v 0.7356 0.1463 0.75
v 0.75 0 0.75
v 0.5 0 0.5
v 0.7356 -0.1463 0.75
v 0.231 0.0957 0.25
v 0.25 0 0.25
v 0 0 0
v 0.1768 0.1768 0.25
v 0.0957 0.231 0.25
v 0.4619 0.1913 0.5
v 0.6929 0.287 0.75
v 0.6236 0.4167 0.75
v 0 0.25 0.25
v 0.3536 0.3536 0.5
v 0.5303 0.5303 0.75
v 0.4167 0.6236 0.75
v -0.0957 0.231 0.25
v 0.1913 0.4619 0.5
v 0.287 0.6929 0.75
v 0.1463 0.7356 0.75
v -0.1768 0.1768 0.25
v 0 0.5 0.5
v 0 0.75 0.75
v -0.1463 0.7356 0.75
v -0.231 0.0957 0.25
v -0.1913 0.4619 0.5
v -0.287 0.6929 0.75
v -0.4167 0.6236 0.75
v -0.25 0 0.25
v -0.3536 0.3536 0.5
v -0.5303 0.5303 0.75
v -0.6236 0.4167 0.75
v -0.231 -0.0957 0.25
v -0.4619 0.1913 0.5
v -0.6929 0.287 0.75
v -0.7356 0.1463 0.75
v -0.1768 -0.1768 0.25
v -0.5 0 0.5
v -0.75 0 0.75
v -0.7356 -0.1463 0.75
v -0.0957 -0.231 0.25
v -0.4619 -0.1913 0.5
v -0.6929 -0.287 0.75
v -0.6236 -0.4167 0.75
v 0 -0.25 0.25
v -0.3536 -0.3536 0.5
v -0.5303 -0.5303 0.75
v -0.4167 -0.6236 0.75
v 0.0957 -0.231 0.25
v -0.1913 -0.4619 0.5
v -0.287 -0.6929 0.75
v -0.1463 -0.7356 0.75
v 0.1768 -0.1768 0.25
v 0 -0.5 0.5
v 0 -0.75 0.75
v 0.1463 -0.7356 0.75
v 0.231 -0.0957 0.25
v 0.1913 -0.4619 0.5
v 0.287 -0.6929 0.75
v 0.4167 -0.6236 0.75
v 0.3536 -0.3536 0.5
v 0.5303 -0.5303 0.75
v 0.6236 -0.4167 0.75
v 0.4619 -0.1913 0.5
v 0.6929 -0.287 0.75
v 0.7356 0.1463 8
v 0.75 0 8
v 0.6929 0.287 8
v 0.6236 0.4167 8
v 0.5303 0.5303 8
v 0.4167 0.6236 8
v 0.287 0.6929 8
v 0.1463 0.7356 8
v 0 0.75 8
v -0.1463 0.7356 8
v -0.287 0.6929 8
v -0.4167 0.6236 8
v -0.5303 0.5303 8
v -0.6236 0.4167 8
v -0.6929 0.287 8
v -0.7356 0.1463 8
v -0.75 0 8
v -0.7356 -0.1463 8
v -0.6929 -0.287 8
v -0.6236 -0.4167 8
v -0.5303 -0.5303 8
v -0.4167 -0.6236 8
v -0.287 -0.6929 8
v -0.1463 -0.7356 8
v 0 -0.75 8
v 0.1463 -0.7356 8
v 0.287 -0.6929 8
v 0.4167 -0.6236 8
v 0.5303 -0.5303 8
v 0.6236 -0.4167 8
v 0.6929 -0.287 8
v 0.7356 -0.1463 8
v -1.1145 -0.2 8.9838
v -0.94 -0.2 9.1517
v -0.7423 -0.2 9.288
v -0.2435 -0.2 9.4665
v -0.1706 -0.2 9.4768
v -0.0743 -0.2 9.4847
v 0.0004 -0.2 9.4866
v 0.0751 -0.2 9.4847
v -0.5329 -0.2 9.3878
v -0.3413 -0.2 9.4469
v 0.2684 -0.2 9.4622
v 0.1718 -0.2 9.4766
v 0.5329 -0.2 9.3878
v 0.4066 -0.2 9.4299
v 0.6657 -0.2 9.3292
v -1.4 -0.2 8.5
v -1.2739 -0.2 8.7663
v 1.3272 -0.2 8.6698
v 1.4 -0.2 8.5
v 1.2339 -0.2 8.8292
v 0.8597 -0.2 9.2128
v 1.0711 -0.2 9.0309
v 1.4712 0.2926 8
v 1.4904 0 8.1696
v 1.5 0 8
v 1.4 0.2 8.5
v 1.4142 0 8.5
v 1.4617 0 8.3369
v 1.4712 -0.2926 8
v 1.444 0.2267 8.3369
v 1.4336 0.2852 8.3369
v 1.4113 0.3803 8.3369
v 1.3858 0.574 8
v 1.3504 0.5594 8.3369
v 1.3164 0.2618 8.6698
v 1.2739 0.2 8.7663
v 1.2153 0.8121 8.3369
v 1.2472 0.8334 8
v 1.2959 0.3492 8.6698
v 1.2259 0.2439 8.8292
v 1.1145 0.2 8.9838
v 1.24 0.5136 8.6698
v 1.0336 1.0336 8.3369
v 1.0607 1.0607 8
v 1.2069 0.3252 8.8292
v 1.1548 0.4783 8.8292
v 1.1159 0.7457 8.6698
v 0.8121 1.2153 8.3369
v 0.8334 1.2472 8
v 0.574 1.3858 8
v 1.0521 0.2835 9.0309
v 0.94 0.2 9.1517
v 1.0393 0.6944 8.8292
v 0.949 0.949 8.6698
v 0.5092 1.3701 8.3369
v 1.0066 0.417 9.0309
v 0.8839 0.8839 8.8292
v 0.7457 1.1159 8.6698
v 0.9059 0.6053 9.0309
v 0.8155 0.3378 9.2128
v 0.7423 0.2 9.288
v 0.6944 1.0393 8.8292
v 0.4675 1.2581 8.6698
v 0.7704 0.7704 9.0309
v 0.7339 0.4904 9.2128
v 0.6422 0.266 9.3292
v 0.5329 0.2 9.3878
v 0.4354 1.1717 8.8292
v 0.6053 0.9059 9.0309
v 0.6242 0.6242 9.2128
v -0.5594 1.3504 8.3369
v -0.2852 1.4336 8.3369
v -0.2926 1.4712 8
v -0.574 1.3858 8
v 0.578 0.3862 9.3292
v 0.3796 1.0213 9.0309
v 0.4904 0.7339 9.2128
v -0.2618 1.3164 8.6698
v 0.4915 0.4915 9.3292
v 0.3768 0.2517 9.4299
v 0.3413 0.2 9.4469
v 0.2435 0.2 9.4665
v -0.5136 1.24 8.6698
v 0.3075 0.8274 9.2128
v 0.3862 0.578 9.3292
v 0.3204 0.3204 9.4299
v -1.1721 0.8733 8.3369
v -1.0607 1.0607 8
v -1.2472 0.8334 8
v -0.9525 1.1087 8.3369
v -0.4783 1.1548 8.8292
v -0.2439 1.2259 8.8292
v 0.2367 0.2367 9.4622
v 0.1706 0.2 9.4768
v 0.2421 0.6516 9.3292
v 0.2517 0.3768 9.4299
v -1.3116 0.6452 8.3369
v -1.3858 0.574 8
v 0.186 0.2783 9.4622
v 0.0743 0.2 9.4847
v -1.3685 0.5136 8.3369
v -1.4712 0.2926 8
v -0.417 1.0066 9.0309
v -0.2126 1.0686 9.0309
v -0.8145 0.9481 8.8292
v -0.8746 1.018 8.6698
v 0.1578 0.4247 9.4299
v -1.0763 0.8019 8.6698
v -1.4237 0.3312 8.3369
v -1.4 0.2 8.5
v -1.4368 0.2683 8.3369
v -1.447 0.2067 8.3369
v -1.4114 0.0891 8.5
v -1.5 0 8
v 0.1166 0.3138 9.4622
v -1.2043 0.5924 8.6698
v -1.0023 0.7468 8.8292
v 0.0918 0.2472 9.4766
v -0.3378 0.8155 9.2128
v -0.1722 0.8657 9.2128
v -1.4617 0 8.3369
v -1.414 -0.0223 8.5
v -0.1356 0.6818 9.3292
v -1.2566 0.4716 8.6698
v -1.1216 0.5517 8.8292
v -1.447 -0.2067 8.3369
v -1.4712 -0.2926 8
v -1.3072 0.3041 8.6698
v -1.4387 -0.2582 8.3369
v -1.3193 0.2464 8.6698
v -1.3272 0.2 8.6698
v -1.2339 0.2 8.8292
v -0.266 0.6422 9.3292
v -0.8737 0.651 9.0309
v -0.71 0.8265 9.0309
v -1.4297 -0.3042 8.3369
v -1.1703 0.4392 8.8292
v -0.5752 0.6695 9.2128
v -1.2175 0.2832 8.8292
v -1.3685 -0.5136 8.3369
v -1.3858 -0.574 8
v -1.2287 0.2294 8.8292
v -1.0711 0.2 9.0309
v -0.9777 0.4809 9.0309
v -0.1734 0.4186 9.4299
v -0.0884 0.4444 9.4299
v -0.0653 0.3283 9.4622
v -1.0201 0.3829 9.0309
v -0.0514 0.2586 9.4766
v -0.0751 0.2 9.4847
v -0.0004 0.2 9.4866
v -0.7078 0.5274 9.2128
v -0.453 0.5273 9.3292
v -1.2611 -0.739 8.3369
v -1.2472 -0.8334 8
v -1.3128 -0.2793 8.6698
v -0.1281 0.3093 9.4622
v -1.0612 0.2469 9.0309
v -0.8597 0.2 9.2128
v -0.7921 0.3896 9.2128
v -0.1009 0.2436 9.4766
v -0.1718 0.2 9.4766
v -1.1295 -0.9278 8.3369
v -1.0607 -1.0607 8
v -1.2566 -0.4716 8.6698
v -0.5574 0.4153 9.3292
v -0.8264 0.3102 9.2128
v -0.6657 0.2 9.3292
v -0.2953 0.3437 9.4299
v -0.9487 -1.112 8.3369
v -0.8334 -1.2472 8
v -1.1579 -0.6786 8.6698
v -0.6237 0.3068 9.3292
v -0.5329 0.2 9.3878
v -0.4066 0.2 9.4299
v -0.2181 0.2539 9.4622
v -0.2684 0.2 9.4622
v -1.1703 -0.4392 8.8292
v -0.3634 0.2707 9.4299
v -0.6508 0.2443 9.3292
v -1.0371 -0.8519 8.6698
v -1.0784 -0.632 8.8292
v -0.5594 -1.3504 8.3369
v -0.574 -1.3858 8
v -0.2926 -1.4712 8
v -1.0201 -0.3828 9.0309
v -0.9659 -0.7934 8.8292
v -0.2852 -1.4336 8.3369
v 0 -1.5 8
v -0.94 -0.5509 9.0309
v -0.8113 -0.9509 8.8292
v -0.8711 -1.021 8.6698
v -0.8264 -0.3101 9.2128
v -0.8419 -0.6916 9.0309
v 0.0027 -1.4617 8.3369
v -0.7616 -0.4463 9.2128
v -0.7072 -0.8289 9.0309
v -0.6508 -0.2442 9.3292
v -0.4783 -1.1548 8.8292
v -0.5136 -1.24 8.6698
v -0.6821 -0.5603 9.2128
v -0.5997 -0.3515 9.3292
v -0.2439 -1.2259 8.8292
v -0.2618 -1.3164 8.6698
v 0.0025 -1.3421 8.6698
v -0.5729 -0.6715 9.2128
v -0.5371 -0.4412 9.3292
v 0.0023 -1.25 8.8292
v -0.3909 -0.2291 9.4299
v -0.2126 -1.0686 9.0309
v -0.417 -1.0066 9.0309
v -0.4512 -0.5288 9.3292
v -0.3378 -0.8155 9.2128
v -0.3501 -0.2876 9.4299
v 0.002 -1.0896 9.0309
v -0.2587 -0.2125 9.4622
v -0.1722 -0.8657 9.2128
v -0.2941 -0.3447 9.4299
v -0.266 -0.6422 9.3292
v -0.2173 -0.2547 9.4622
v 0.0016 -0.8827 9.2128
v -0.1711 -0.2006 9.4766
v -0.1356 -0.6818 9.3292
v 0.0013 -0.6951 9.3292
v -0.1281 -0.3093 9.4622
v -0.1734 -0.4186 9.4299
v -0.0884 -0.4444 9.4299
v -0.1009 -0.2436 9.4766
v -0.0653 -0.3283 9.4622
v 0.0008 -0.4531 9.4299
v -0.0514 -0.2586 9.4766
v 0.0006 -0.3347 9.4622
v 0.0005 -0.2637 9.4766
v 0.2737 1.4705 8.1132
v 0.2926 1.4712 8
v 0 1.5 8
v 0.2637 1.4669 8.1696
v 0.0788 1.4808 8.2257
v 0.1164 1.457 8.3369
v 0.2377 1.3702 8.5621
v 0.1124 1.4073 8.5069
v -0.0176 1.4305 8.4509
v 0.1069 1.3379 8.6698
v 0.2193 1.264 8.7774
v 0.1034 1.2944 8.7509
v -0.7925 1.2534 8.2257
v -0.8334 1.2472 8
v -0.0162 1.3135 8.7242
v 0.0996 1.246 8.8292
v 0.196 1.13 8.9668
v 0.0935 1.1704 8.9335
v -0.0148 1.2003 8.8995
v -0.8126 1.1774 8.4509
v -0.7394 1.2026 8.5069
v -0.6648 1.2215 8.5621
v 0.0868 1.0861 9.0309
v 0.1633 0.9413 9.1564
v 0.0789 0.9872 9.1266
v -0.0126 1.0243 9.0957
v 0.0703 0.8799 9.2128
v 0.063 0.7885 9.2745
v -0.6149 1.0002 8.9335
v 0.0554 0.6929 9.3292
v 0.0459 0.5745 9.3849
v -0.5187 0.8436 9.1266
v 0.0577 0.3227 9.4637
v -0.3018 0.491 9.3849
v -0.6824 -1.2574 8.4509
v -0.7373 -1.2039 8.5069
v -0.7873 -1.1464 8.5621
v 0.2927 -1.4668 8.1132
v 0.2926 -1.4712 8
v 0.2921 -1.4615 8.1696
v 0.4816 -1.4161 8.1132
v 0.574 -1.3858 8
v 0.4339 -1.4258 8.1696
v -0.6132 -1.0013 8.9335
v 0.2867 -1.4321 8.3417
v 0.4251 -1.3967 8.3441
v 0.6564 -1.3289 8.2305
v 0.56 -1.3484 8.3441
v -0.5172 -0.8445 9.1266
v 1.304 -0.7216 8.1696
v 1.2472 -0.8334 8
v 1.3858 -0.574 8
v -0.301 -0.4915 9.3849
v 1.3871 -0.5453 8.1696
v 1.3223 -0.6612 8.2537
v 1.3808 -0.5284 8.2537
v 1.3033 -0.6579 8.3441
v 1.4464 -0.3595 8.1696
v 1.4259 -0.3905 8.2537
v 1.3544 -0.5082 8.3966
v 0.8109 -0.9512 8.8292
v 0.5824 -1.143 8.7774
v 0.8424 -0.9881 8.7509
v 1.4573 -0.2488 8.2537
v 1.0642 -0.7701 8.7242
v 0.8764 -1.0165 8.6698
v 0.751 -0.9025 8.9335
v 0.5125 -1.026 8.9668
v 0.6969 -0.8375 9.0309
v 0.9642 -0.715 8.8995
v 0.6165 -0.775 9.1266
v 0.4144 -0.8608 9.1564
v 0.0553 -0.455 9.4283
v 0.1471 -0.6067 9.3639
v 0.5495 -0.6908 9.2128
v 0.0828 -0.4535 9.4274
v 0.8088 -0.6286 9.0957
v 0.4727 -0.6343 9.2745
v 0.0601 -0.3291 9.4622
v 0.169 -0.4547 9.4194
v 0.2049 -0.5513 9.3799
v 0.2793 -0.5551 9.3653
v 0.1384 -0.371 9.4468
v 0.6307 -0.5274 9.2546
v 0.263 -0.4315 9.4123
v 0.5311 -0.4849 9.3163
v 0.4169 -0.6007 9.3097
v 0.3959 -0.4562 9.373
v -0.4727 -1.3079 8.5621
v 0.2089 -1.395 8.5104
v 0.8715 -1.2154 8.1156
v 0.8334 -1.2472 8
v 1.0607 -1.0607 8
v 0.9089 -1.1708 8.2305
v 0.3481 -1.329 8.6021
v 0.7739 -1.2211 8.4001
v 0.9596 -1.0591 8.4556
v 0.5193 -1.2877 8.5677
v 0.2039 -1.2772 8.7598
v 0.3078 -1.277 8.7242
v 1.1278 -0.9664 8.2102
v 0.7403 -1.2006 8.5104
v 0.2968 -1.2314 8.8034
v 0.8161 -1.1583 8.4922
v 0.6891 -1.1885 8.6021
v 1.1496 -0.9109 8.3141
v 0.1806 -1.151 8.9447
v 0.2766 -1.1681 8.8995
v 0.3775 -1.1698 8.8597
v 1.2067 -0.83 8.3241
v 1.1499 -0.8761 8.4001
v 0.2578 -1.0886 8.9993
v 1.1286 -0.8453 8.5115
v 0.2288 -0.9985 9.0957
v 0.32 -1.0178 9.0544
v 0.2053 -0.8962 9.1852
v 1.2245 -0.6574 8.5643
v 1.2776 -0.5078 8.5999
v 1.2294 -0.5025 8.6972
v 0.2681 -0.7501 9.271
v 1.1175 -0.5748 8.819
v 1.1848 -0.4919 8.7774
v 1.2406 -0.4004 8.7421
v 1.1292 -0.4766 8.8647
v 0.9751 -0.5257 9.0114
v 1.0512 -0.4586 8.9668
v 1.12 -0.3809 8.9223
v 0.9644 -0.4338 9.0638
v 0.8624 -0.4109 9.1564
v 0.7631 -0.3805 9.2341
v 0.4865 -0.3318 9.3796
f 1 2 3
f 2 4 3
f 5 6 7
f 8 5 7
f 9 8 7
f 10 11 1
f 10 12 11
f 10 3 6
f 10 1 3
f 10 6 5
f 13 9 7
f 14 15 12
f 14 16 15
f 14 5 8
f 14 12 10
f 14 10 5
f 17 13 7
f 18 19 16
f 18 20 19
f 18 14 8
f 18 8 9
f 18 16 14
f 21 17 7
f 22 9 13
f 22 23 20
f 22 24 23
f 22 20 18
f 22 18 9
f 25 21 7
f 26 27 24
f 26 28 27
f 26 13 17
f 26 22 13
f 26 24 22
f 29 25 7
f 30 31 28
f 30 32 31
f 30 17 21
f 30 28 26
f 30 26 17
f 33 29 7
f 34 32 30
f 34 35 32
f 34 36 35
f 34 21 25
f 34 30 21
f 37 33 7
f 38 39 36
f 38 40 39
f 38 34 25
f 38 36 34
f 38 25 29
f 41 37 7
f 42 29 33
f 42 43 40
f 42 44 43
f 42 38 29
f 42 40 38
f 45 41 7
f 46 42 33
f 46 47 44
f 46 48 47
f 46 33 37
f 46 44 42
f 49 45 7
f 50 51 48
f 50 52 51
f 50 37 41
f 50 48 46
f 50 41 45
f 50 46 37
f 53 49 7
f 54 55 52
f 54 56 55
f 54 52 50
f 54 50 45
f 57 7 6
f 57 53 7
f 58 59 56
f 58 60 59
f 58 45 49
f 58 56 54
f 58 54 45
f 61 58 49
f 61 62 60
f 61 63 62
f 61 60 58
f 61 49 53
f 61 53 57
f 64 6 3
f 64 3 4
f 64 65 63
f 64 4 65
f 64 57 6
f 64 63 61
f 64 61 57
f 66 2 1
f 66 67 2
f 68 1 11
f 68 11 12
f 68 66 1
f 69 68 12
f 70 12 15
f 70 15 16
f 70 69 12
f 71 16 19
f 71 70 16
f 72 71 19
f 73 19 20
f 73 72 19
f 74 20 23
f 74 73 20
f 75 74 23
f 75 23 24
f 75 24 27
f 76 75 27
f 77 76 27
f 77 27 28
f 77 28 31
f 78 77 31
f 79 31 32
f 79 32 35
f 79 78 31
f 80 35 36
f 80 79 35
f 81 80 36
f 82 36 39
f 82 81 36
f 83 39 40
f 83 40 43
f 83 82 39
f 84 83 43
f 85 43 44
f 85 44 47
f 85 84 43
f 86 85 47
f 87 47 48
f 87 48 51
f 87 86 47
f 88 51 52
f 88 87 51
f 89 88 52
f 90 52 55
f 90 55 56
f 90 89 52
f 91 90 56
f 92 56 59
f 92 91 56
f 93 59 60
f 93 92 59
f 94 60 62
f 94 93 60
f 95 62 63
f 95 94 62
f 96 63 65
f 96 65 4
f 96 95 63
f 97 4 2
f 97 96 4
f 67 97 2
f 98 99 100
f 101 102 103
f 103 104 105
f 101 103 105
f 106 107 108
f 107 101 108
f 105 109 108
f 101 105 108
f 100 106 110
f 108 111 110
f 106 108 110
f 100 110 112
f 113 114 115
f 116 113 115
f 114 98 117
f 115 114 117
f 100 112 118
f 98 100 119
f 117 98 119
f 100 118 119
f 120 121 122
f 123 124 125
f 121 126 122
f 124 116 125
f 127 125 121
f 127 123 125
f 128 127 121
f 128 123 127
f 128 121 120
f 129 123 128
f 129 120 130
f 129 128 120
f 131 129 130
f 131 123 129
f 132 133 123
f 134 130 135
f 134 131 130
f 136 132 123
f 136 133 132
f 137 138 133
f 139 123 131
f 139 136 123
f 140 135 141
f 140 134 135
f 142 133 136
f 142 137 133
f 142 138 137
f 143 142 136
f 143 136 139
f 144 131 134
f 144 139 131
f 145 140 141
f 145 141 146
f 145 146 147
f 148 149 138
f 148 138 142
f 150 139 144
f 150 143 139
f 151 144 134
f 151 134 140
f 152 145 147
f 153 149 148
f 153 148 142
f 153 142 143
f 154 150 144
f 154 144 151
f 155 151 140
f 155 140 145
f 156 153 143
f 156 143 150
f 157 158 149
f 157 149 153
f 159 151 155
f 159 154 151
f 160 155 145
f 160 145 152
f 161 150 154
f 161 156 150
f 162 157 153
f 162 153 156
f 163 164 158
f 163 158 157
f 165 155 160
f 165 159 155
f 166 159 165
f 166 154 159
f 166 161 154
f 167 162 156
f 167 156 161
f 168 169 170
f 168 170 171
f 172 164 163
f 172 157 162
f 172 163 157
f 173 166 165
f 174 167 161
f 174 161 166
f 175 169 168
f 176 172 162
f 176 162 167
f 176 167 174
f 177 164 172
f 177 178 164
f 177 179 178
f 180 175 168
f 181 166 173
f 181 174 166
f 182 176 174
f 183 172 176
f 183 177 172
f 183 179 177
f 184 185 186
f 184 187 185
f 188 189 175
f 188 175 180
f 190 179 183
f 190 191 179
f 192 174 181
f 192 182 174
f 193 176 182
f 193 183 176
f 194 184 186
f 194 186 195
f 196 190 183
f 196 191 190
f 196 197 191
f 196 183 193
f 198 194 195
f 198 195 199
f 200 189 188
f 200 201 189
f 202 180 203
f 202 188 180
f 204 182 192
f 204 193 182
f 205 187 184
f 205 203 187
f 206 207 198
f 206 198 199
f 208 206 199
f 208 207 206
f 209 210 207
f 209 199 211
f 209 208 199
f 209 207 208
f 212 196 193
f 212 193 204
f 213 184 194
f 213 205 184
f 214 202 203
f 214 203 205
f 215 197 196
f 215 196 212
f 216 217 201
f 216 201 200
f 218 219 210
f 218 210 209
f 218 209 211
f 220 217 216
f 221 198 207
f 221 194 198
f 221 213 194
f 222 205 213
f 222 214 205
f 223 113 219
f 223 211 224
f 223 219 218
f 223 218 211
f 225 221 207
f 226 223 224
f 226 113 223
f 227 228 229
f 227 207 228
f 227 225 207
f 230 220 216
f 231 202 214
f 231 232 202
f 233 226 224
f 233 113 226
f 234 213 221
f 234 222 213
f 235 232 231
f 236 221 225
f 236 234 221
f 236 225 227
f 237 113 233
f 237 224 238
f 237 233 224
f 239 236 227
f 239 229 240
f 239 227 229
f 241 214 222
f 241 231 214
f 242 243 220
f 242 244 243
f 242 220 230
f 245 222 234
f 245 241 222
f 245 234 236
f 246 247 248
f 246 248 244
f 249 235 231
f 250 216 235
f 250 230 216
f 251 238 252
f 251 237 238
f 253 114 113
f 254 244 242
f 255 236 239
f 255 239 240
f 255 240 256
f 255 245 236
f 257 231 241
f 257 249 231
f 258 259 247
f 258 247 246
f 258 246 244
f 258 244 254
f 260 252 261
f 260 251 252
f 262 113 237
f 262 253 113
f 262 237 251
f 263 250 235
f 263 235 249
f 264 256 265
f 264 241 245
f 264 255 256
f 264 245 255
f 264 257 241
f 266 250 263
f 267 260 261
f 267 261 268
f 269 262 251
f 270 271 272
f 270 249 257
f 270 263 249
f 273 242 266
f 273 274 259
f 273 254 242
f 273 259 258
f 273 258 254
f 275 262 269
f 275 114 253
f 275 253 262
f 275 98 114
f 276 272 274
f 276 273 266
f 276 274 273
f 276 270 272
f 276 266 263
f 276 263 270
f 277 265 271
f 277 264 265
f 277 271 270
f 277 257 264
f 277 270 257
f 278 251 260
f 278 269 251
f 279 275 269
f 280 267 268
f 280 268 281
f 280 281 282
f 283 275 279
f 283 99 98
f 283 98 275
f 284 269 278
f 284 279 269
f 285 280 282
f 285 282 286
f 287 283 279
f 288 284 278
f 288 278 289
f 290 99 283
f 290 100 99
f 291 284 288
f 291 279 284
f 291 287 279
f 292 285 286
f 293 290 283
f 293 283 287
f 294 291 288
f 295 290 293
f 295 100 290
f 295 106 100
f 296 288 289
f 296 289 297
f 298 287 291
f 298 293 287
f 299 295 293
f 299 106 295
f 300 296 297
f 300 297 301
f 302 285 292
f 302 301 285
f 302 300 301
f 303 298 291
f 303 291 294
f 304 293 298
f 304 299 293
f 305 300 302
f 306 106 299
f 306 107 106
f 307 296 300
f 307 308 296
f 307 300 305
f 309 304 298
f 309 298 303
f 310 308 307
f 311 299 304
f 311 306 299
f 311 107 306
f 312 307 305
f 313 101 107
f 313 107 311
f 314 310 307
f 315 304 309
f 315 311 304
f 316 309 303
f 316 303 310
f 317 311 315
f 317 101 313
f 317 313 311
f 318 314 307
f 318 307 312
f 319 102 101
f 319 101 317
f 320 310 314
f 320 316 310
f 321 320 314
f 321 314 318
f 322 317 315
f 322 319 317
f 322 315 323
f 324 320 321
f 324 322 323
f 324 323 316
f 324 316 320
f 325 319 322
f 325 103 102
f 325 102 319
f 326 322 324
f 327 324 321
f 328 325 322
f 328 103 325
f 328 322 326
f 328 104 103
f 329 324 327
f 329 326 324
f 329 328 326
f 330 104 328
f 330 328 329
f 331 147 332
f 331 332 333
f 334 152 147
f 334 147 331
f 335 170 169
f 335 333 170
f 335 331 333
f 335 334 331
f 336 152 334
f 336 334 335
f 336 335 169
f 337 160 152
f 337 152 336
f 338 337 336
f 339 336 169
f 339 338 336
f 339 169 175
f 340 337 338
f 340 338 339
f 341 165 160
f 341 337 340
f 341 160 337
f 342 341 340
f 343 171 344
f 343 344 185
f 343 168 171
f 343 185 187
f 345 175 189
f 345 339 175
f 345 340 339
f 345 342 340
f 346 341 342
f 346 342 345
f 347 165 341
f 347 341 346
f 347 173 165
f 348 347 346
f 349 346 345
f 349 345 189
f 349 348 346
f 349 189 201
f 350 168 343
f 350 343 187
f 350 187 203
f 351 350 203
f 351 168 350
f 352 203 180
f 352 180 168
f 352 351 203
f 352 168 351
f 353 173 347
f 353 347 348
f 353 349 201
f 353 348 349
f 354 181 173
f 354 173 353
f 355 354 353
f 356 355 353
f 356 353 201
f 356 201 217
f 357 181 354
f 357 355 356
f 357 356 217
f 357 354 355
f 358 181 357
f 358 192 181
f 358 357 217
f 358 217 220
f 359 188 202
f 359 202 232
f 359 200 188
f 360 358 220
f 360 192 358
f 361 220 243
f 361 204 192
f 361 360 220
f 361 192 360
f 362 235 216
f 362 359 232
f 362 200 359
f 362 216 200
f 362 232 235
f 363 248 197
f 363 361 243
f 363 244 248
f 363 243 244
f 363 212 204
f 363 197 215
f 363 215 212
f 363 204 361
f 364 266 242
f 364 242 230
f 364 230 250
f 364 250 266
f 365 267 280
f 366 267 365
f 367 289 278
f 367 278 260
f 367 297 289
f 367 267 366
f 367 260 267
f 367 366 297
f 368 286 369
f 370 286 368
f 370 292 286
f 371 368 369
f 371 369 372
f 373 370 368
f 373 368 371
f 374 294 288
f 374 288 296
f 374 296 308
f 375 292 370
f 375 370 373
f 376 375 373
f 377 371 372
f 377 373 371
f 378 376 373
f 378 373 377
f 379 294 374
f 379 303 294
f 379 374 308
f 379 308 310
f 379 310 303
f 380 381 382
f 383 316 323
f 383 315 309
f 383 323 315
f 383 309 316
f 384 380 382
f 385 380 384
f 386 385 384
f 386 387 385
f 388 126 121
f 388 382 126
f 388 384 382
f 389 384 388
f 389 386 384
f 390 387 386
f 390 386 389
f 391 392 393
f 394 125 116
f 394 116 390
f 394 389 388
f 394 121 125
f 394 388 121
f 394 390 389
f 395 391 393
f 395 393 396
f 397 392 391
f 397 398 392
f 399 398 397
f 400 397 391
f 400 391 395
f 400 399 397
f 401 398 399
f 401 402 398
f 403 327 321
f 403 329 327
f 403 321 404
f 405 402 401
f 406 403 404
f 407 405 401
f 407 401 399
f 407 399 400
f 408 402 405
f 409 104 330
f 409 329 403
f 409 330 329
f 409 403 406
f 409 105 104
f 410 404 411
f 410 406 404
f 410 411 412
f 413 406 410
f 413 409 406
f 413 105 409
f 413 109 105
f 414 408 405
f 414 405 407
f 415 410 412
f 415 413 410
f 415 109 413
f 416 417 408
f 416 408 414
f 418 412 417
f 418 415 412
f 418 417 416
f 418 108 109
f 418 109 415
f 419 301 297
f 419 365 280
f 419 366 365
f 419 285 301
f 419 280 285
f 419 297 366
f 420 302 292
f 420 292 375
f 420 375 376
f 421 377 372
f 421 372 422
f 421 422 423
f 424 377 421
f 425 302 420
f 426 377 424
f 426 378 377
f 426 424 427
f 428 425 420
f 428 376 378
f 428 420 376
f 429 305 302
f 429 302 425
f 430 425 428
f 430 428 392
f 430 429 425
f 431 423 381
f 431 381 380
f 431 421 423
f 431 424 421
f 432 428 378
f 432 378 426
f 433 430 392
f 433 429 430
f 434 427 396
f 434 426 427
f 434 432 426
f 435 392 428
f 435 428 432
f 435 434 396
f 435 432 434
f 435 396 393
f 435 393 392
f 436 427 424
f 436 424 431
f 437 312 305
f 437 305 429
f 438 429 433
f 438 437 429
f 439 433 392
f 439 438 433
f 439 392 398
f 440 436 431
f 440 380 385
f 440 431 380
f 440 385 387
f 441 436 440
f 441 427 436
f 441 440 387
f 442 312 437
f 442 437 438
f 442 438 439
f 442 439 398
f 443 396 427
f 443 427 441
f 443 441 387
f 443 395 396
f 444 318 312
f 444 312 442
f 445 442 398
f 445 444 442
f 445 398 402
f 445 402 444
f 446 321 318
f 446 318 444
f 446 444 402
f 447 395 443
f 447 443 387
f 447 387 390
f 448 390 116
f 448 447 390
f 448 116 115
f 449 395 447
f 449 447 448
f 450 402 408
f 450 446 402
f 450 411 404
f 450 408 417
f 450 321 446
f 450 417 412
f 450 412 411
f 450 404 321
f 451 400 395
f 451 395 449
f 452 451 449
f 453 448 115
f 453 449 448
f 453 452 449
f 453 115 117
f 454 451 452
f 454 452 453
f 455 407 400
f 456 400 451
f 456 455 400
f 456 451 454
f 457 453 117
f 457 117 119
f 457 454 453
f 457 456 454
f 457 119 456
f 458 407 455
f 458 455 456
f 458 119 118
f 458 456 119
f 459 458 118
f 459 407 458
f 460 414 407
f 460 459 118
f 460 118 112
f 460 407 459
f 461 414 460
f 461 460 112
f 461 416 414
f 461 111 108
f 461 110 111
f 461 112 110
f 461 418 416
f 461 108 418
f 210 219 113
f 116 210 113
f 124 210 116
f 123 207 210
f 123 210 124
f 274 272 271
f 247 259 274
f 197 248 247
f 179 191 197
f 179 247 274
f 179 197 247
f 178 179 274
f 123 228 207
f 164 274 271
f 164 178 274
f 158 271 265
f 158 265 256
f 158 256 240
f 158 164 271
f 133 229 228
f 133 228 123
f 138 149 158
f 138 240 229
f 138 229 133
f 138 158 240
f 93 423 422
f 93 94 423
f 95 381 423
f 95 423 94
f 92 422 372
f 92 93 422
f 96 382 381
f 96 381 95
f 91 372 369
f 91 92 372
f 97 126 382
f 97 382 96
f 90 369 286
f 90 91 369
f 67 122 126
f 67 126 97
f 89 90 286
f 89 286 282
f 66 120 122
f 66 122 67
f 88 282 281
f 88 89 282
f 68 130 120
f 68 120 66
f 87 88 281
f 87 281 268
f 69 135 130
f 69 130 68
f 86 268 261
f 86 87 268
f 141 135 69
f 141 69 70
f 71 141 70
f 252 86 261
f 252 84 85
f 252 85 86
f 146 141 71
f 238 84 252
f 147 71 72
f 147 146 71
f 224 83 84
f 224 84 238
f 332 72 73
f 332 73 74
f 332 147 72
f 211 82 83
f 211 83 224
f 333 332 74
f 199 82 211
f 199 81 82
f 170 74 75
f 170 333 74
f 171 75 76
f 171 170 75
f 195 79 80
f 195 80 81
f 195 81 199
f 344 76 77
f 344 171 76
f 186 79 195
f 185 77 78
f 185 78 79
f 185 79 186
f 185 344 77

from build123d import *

# Parameters (mm, degrees)
F3_W     = 3
F3_H     = 0.4
F4_DEPTH = 1


with BuildPart() as f1:
    # F0 (on Front) → F1 (revolve)
    with BuildSketch(Plane.XZ):
        with BuildLine():
            Line((0, 9.5), (0, 0))
            Line((0, 0), (0.75, 0.75))
            Line((0.75, 0.75), (0.75, 8))
            Line((0.75, 8), (1.5, 8))
            ThreePointArc((1.5, 8), (1.06066, 9.06066), (0, 9.5))
        make_face()
    revolve(axis=Axis((0, 0, 4.75), (0, 0, 1)))

    # F3 (on offset) → F4 (cut)
    with BuildSketch(Plane.XY.offset(9.5)):
        Rectangle(F3_W, F3_H)
    extrude(amount=-F4_DEPTH, mode=Mode.SUBTRACT)


solid = f1.part
